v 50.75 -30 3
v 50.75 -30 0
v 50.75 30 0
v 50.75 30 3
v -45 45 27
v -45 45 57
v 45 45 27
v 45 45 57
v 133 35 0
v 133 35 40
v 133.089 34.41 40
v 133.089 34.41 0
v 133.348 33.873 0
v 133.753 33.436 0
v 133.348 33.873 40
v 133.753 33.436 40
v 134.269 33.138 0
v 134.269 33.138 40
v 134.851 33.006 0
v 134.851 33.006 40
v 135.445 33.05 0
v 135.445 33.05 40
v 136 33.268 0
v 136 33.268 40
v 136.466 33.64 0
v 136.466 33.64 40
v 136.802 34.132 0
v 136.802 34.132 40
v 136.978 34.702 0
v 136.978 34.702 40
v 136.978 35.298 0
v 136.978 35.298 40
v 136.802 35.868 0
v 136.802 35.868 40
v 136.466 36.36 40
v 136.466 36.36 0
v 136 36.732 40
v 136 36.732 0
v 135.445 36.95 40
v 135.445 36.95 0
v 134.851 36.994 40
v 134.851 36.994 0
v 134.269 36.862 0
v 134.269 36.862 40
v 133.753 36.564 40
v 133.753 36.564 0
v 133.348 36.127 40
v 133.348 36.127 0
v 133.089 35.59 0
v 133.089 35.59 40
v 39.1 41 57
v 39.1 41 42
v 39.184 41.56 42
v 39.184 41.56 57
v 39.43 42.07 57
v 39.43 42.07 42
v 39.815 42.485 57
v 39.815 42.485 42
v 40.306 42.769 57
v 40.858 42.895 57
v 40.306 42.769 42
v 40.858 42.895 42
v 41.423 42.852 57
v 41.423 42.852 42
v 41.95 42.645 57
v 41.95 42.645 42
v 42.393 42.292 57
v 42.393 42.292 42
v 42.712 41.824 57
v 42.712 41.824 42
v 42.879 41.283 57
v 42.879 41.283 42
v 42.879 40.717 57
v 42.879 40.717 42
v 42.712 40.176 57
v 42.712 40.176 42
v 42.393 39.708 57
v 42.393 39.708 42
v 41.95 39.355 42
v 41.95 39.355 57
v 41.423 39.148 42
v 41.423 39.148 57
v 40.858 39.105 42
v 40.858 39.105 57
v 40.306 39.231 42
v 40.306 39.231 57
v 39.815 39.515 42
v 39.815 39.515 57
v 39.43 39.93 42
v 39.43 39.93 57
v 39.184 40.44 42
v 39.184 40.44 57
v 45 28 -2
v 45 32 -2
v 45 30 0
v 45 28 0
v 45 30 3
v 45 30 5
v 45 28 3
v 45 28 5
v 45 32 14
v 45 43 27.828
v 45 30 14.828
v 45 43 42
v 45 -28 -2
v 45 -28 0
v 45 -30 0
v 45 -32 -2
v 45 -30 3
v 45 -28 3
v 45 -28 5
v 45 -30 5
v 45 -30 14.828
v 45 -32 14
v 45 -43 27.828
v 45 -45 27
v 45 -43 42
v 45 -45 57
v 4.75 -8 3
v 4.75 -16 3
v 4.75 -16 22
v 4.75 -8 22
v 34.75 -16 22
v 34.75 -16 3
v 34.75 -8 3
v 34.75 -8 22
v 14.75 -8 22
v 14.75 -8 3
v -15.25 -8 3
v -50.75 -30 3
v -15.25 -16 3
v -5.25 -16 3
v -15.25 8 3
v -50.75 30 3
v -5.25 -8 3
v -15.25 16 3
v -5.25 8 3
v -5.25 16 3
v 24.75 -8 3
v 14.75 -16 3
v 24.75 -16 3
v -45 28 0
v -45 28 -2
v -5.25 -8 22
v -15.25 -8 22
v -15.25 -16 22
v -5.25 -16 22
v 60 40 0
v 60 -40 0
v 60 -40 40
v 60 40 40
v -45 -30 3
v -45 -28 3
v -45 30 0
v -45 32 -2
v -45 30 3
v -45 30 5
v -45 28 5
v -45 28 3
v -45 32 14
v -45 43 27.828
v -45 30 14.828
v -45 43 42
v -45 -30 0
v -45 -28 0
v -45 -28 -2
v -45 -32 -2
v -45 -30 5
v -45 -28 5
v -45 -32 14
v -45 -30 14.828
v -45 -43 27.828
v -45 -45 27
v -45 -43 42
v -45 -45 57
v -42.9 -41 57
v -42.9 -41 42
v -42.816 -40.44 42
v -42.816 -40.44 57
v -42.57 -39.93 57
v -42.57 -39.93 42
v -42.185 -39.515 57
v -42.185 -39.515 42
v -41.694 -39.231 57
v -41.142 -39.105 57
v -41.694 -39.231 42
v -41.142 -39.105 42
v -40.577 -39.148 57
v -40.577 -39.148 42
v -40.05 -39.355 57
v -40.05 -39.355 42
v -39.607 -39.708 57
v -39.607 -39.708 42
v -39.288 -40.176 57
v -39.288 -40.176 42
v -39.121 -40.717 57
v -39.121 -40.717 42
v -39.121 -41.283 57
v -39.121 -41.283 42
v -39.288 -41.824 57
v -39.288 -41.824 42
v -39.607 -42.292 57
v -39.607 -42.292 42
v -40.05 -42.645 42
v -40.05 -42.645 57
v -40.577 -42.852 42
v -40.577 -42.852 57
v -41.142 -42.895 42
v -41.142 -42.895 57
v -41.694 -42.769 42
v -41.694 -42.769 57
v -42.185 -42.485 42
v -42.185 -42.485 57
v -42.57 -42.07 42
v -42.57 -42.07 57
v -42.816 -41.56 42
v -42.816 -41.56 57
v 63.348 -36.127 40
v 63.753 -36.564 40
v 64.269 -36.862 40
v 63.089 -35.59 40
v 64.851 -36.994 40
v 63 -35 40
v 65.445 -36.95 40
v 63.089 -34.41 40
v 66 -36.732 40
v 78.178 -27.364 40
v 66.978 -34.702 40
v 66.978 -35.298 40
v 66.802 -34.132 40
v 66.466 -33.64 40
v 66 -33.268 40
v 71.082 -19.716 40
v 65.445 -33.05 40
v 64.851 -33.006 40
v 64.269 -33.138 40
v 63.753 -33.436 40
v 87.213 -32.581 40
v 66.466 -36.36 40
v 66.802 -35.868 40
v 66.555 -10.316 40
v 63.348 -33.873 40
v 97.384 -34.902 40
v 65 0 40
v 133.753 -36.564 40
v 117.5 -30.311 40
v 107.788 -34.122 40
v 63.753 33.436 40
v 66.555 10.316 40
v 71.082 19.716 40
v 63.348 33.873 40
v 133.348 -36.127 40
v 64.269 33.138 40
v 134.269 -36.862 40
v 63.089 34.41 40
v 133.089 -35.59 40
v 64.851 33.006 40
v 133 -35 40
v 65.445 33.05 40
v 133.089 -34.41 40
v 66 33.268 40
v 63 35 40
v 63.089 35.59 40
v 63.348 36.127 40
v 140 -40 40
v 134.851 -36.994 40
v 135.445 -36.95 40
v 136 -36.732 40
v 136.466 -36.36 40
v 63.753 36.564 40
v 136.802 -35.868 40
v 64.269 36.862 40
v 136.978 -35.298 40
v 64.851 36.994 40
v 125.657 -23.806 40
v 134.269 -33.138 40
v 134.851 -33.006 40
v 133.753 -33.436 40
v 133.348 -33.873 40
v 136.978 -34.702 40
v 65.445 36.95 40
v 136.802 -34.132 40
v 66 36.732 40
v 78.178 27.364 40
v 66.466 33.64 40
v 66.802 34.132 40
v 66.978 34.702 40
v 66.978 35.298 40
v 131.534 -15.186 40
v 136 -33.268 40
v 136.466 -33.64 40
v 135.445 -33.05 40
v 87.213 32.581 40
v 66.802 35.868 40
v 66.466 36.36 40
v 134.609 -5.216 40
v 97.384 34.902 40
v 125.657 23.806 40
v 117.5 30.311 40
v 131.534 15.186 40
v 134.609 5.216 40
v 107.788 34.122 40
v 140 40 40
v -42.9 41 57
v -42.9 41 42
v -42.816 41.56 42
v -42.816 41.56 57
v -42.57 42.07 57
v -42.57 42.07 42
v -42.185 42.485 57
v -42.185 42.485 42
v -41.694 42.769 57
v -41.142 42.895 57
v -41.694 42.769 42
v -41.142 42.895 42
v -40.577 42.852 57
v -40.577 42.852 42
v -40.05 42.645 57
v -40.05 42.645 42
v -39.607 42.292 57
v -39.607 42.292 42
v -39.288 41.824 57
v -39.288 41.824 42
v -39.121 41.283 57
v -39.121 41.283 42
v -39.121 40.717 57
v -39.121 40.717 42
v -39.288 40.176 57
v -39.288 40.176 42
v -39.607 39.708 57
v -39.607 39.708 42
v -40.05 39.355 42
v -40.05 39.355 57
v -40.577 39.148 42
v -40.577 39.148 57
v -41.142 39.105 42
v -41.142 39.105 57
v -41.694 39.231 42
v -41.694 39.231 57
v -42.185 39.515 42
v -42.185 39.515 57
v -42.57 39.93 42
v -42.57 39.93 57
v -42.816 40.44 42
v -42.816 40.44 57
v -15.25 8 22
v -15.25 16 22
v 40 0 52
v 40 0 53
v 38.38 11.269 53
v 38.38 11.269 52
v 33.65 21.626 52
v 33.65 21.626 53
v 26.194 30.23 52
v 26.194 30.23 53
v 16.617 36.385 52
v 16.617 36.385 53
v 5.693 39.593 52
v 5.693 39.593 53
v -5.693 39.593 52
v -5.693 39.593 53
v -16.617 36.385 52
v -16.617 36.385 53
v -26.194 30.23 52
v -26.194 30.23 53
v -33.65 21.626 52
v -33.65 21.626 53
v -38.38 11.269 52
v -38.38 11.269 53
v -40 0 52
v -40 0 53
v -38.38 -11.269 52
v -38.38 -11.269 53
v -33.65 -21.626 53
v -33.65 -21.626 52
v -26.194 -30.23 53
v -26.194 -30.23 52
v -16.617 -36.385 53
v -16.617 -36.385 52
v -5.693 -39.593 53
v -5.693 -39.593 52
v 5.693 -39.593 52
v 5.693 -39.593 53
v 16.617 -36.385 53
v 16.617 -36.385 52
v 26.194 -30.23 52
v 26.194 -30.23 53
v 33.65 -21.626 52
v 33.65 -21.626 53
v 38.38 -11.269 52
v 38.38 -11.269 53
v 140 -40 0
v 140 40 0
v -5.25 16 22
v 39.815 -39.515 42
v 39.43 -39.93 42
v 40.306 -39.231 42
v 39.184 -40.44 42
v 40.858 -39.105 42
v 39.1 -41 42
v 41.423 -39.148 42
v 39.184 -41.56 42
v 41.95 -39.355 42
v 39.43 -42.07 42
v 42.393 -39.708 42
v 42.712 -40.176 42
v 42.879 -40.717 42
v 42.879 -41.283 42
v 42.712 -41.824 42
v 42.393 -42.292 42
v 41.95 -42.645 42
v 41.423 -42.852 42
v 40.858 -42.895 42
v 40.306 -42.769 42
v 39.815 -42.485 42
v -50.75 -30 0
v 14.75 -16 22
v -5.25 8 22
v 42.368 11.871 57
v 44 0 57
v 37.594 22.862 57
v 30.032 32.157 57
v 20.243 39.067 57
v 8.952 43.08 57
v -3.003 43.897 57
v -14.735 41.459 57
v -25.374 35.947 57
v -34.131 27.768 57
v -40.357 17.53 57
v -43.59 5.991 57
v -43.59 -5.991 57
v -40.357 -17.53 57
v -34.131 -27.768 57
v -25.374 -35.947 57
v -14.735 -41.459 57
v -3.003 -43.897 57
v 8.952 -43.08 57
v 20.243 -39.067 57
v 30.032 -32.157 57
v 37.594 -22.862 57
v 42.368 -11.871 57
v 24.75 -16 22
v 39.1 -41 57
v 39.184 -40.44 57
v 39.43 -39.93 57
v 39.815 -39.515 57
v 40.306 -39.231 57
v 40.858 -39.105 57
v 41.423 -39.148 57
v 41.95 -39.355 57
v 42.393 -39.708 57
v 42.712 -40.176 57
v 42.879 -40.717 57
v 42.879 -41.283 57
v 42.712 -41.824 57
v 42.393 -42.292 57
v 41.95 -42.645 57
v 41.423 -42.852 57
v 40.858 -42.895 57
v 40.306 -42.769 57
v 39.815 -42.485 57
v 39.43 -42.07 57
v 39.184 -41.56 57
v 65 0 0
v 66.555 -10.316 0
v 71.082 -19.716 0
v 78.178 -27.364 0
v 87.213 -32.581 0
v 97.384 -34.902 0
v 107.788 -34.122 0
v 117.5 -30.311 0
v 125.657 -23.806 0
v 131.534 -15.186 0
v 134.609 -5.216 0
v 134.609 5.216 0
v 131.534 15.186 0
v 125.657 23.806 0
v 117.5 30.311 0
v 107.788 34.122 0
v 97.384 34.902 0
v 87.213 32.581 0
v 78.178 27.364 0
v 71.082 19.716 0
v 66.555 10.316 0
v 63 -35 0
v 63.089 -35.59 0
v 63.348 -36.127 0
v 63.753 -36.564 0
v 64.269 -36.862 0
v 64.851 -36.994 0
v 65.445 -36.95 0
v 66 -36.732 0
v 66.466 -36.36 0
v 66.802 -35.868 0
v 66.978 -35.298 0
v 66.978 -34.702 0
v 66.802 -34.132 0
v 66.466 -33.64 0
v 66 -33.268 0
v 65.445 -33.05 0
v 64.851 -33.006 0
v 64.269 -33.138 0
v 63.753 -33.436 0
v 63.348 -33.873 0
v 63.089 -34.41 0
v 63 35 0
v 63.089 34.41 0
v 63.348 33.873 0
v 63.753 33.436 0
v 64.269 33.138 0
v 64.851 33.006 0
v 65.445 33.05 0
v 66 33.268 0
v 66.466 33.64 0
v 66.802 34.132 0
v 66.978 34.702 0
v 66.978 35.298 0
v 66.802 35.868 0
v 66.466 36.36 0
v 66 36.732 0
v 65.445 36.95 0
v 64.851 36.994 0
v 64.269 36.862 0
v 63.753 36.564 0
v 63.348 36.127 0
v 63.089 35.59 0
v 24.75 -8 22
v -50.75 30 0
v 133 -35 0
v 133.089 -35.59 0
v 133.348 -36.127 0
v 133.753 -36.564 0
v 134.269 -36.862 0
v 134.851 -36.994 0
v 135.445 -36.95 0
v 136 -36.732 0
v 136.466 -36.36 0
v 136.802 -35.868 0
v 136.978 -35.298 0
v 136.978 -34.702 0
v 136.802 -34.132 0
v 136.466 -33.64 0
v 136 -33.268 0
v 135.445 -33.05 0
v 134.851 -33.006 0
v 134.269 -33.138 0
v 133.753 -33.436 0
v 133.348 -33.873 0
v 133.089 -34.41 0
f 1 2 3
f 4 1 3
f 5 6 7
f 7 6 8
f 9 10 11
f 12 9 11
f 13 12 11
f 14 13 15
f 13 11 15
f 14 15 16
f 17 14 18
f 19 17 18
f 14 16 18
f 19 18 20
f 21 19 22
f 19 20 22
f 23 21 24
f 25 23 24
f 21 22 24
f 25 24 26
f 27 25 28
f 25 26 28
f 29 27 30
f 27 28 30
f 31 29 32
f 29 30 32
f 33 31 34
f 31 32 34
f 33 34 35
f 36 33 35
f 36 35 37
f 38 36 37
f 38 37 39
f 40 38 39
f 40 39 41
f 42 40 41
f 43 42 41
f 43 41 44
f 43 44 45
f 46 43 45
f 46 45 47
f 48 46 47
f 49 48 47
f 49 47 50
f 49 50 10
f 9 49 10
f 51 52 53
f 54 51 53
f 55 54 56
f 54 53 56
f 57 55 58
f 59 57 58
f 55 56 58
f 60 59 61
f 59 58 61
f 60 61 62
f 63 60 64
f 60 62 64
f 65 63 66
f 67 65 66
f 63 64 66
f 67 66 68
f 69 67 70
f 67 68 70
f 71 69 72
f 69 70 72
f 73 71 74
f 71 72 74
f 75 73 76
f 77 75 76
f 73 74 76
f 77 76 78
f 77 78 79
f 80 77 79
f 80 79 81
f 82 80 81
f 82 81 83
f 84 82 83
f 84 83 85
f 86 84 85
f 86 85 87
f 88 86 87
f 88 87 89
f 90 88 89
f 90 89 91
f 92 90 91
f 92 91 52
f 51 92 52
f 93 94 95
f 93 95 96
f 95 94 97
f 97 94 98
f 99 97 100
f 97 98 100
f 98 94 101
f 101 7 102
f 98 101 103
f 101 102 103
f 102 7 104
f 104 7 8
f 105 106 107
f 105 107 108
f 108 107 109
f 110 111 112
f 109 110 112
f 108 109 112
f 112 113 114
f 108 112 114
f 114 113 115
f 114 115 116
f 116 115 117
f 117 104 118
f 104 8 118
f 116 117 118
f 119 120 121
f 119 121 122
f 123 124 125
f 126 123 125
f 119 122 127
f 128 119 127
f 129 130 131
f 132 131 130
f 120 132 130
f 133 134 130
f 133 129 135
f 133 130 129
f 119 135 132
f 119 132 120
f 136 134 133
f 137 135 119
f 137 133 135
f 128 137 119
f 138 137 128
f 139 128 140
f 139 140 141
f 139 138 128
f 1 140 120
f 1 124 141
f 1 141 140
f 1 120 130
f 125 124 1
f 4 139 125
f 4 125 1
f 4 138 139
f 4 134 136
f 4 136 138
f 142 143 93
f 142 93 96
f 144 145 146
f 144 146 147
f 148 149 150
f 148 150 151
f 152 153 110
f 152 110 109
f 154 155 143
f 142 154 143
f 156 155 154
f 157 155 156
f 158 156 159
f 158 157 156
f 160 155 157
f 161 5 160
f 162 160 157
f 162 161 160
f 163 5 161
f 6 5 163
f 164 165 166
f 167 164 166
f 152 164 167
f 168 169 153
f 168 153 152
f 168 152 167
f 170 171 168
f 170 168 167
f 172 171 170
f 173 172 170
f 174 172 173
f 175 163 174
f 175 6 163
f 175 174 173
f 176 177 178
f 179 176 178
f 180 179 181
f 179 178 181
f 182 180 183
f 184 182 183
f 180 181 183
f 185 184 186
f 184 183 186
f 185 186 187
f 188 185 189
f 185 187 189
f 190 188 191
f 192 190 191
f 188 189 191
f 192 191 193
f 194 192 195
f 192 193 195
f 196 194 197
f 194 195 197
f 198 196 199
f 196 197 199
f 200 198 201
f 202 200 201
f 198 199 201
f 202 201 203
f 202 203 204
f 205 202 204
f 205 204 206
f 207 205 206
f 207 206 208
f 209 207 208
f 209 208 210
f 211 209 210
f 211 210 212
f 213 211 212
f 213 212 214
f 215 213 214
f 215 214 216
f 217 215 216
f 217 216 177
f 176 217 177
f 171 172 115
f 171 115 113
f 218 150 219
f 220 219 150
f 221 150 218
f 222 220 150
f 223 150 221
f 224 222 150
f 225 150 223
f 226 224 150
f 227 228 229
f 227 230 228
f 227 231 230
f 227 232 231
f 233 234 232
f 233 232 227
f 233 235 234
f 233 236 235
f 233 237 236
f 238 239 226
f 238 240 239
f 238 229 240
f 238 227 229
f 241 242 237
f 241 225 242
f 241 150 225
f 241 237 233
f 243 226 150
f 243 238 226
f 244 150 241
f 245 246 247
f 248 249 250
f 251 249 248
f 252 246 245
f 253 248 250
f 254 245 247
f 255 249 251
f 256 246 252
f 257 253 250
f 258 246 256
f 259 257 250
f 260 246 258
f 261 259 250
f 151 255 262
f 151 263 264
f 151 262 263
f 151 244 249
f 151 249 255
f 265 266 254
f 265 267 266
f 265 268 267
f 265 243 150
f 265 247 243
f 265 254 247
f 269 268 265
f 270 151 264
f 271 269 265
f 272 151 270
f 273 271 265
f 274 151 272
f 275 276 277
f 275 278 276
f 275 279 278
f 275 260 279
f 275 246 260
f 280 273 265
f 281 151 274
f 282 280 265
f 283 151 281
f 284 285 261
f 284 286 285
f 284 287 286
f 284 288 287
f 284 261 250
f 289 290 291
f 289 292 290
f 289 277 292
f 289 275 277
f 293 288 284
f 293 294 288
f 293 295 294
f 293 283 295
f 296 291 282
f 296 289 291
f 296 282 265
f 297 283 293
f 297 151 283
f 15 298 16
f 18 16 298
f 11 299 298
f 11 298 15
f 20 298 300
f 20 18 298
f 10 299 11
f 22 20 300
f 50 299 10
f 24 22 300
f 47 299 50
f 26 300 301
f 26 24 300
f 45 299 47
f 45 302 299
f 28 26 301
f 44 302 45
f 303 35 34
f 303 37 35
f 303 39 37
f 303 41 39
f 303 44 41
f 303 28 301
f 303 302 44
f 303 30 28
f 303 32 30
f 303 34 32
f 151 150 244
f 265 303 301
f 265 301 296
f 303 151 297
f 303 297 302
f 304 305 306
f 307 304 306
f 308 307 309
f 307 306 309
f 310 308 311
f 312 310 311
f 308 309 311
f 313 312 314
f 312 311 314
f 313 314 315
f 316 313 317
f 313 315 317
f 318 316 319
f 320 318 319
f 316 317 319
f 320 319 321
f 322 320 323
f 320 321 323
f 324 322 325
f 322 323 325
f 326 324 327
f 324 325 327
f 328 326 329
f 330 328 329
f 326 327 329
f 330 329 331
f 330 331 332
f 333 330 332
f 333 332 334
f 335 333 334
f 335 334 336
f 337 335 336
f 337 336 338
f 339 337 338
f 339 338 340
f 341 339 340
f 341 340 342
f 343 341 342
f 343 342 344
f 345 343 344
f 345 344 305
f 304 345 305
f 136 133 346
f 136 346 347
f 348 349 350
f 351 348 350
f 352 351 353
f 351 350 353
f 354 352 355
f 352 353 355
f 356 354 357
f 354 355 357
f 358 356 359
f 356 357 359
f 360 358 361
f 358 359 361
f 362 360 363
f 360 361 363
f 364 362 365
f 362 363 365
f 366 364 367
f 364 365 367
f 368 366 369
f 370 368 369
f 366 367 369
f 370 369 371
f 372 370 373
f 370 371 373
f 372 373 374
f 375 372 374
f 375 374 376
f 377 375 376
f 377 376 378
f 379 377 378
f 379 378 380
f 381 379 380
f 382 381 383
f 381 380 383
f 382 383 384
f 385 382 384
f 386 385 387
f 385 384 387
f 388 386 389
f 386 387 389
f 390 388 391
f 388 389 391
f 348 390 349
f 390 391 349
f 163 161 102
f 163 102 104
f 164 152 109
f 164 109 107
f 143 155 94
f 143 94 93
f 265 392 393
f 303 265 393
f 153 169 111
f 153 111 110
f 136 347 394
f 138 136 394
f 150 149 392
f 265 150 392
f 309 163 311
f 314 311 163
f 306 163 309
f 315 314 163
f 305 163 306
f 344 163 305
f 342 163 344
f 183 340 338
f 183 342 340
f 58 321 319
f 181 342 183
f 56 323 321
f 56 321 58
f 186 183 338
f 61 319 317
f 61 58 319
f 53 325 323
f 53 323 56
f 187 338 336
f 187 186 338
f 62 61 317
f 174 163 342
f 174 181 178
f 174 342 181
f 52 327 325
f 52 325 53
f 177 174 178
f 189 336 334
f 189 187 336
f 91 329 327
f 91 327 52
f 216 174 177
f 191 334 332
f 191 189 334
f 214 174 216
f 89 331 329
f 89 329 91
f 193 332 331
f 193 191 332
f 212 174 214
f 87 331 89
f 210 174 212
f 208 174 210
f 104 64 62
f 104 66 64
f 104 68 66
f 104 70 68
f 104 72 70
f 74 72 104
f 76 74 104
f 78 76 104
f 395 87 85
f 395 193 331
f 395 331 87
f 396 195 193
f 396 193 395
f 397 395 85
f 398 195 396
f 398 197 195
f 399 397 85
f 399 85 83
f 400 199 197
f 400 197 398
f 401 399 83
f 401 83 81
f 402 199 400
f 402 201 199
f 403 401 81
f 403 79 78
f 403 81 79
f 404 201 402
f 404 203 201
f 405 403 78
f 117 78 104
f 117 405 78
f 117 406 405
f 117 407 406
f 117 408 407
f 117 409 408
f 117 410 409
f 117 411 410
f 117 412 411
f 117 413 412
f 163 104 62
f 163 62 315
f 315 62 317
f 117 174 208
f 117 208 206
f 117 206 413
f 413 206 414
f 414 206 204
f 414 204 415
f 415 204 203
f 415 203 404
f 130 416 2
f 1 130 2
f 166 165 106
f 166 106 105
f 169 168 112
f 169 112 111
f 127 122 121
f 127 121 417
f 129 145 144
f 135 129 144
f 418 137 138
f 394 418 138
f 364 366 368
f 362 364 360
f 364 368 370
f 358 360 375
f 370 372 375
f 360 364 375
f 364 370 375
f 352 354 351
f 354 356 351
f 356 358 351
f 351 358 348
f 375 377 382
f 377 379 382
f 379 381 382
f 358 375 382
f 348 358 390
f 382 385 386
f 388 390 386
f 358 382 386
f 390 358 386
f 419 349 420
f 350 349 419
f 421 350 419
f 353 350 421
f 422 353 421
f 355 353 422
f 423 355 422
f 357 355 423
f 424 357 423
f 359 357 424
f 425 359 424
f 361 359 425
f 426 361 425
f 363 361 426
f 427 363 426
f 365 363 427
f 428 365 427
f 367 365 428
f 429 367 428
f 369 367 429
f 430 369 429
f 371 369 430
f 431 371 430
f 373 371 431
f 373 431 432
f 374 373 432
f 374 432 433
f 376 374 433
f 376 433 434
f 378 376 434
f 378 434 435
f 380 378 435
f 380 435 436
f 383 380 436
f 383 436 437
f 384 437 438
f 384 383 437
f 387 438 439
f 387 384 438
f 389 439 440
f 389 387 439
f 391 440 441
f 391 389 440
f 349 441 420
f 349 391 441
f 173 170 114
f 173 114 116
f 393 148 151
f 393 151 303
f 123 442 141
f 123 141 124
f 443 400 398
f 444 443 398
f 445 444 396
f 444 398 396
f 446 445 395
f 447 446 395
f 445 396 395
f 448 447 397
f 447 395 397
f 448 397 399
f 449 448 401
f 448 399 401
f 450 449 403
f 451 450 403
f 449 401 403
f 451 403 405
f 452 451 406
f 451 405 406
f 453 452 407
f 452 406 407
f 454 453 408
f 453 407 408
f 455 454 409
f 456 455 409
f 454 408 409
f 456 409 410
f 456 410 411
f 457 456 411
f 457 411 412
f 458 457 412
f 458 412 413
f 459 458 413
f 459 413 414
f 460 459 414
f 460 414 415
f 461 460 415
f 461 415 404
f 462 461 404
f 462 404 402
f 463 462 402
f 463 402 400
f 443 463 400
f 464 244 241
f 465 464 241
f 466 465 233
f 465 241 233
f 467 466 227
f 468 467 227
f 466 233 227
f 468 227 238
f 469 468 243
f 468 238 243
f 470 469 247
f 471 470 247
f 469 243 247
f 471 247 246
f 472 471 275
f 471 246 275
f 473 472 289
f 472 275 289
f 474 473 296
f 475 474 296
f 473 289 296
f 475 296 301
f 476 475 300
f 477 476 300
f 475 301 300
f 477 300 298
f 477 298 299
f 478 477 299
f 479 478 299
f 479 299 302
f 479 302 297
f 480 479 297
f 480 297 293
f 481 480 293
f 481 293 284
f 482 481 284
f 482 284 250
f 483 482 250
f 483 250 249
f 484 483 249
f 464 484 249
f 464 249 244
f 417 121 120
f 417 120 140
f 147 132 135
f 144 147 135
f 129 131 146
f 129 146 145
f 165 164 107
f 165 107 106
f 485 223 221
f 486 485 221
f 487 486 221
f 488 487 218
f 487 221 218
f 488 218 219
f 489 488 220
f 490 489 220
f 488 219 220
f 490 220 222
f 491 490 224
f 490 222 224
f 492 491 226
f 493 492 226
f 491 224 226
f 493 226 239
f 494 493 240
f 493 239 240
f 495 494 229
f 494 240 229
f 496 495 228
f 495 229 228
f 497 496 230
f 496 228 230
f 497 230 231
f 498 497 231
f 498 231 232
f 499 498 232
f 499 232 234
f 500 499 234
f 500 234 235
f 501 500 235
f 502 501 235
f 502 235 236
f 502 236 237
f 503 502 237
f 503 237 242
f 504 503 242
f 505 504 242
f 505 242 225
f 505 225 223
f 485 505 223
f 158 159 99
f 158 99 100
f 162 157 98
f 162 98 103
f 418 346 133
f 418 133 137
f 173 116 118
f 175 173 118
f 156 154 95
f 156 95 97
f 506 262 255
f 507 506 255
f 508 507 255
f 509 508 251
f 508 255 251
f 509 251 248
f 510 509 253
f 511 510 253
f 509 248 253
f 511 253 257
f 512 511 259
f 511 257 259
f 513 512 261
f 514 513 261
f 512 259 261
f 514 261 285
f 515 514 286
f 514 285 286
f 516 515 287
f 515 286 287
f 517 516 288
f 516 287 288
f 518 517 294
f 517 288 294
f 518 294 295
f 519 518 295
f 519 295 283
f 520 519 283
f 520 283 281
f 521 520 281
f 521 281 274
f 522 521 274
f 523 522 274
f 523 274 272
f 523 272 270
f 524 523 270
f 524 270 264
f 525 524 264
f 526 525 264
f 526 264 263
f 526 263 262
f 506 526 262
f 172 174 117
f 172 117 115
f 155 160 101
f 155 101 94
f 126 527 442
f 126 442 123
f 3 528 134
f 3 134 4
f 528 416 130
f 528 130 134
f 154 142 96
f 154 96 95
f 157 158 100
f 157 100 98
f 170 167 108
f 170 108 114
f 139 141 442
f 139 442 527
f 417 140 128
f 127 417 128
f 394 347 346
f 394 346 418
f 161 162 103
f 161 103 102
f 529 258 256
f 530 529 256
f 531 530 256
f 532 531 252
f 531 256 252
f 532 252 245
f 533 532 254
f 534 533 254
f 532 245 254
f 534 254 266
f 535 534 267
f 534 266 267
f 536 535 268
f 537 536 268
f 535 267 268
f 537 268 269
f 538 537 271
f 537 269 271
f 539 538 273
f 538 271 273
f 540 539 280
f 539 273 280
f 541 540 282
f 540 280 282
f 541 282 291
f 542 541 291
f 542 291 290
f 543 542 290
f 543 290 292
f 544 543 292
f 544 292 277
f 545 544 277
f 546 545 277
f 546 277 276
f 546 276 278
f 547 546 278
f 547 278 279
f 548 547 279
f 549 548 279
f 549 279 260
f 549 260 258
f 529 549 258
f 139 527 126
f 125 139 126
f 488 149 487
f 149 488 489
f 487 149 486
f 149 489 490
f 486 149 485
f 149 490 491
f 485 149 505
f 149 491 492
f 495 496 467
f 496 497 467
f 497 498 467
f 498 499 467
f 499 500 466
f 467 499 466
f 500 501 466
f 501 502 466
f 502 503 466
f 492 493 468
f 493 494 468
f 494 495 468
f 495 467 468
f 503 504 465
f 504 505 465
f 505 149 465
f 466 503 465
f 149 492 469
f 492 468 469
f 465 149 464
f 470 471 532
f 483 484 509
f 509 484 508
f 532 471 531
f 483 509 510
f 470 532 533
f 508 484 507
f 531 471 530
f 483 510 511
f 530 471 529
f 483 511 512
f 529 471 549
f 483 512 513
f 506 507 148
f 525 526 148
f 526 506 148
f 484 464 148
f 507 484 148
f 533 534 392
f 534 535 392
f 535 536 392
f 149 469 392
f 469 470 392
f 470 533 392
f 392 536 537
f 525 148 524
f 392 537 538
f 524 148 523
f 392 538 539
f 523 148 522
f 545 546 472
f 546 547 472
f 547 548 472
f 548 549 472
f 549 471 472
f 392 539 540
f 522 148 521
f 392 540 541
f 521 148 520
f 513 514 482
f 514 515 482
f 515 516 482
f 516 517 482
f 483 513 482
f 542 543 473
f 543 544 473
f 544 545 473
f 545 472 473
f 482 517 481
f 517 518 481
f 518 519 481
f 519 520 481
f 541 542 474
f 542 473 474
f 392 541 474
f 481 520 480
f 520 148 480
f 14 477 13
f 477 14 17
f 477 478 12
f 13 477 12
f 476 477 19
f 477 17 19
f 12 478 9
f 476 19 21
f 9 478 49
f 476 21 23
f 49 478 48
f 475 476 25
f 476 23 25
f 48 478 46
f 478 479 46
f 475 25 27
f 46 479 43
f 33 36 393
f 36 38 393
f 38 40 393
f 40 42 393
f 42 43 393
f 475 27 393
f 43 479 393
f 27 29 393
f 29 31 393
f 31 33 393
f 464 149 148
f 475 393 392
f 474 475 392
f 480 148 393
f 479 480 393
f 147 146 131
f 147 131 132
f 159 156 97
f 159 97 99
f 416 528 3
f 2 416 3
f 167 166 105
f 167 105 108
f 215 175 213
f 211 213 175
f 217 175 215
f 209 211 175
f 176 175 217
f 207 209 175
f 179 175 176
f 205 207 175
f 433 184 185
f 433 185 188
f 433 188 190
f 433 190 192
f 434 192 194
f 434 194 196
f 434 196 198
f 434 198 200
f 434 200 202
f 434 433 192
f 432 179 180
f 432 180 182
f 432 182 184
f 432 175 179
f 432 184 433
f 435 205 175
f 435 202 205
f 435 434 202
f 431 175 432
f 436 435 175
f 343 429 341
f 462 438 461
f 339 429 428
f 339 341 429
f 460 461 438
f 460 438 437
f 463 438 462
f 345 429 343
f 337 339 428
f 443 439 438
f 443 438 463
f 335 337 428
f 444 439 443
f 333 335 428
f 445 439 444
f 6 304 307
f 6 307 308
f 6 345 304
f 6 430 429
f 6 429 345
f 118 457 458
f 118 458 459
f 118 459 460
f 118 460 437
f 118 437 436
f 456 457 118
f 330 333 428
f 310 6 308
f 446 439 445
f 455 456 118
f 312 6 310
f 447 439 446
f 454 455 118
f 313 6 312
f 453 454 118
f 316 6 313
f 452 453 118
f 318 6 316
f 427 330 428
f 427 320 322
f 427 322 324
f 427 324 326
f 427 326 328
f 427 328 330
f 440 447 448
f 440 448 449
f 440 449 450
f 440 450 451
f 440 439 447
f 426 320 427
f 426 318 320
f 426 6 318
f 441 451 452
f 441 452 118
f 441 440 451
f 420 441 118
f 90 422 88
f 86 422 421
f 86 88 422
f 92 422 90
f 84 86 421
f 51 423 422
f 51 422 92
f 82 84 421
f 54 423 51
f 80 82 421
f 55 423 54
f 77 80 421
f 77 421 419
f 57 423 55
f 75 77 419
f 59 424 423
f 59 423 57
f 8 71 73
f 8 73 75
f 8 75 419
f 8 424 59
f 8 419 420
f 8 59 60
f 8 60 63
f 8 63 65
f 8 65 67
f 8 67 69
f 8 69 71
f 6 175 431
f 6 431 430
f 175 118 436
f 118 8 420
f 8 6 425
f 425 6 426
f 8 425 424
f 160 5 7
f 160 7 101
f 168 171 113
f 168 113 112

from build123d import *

# Parameters (mm, degrees)
F0_W      = 101.5
F0_H      = 60
F1_DEPTH  = 3
F2_W      = 10
F2_H      = 8
F3_DEPTH  = 19
F4_W      = 80
F4_H      = 80
F5_DEPTH  = 40
F6_D      = 70
F7_D      = 4
F9_W      = 90
F9_H      = 90
F9_R      = 40
F10_DEPTH = 5
F12_W     = 90
F12_H     = 90
F13_DEPTH = 10
F15_SIZE  = 4
F16_D     = 3.8
F18_DEPTH = 90


with BuildPart() as f1:
    # F0 (on Top) → F1 (new body)
    with BuildSketch(Plane.XY):
        Rectangle(F0_W, F0_H)
    extrude(amount=F1_DEPTH)

    # F2 (on face) → F3 (join)
    with BuildSketch(Plane.XY.offset(3)):
        with Locations((29.75, -12)):
            Rectangle(F2_W, F2_H)
        with Locations((9.75, -12)):
            Rectangle(F2_W, F2_H)
        with Locations((-10.25, -12)):
            Rectangle(F2_W, F2_H)
        with Locations((-10.25, 12)):
            Rectangle(F2_W, F2_H)
    extrude(amount=F3_DEPTH)


with BuildPart() as f5:
    # F4 (on Top) → F5 (new body)
    with BuildSketch(Plane.XY):
        with Locations((100, 0)):
            Rectangle(F4_W, F4_H)
    extrude(amount=F5_DEPTH)

    # F6 (through all)
    with Locations(Plane(origin=(0, 0, 0), x_dir=(1, 0, 0), z_dir=(0, 0, -1))):
        with Locations((100, 0)):
            Hole(F6_D / 2)

    # F7 (through all)
    with Locations(Plane(origin=(0, 0, 0), x_dir=(1, 0, 0), z_dir=(0, 0, -1))):
        with Locations((135, -35), (65, -35), (65, 35), (135, 35)):
            Hole(F7_D / 2)


with BuildPart() as f10:
    # F9 (on offset) → F10 (new body)
    with BuildSketch(Plane.XY.offset(57)):
        Rectangle(F9_W, F9_H)
        Circle(F9_R, mode=Mode.SUBTRACT)
    extrude(amount=-F10_DEPTH)

    # F12 (on face) → F13 (join)
    with BuildSketch(Plane(origin=(0, 0, 52), x_dir=(1, 0, 0), z_dir=(0, 0, -1))):
        Rectangle(F12_W, F12_H)
    extrude(amount=F13_DEPTH)

    # F15
    f15_edges = [f10.edges().sort_by_distance(p)[0] for p in [
        (-40, 0, 57),
    ]]
    chamfer(f15_edges, length=F15_SIZE)

    # F16 (through all)
    with Locations(Plane.XY.offset(57)):
        with Locations((-41, 41), (41, 41), (41, -41), (-41, -41)):
            Hole(F16_D / 2)

    # F17 (on face) → F18 (join, through all)
    with BuildSketch(Plane(origin=(-45, 0, 0), x_dir=(0, -1, 0), z_dir=(-1, 0, 0))):
        Polygon((45, 42), (43, 42), (43, 27.8284271247), (30, 14.8284271247), (30, 5), (28, 5), (28, 3), (30, 3), (30, 0), (28, 0), (28, -2), (32, -2), (32, 14), (45, 27), align=None)
        Polygon((-43, 27.8284271247), (-43, 42), (-45, 42), (-45, 27), (-32, 14), (-32, -2), (-28, -2), (-28, 0), (-30, 0), (-30, 3), (-28, 3), (-28, 5), (-30, 5), (-30, 14.8284271247), align=None)
    extrude(amount=-F18_DEPTH)


solid = Compound([f1.part, f5.part, f10.part])
